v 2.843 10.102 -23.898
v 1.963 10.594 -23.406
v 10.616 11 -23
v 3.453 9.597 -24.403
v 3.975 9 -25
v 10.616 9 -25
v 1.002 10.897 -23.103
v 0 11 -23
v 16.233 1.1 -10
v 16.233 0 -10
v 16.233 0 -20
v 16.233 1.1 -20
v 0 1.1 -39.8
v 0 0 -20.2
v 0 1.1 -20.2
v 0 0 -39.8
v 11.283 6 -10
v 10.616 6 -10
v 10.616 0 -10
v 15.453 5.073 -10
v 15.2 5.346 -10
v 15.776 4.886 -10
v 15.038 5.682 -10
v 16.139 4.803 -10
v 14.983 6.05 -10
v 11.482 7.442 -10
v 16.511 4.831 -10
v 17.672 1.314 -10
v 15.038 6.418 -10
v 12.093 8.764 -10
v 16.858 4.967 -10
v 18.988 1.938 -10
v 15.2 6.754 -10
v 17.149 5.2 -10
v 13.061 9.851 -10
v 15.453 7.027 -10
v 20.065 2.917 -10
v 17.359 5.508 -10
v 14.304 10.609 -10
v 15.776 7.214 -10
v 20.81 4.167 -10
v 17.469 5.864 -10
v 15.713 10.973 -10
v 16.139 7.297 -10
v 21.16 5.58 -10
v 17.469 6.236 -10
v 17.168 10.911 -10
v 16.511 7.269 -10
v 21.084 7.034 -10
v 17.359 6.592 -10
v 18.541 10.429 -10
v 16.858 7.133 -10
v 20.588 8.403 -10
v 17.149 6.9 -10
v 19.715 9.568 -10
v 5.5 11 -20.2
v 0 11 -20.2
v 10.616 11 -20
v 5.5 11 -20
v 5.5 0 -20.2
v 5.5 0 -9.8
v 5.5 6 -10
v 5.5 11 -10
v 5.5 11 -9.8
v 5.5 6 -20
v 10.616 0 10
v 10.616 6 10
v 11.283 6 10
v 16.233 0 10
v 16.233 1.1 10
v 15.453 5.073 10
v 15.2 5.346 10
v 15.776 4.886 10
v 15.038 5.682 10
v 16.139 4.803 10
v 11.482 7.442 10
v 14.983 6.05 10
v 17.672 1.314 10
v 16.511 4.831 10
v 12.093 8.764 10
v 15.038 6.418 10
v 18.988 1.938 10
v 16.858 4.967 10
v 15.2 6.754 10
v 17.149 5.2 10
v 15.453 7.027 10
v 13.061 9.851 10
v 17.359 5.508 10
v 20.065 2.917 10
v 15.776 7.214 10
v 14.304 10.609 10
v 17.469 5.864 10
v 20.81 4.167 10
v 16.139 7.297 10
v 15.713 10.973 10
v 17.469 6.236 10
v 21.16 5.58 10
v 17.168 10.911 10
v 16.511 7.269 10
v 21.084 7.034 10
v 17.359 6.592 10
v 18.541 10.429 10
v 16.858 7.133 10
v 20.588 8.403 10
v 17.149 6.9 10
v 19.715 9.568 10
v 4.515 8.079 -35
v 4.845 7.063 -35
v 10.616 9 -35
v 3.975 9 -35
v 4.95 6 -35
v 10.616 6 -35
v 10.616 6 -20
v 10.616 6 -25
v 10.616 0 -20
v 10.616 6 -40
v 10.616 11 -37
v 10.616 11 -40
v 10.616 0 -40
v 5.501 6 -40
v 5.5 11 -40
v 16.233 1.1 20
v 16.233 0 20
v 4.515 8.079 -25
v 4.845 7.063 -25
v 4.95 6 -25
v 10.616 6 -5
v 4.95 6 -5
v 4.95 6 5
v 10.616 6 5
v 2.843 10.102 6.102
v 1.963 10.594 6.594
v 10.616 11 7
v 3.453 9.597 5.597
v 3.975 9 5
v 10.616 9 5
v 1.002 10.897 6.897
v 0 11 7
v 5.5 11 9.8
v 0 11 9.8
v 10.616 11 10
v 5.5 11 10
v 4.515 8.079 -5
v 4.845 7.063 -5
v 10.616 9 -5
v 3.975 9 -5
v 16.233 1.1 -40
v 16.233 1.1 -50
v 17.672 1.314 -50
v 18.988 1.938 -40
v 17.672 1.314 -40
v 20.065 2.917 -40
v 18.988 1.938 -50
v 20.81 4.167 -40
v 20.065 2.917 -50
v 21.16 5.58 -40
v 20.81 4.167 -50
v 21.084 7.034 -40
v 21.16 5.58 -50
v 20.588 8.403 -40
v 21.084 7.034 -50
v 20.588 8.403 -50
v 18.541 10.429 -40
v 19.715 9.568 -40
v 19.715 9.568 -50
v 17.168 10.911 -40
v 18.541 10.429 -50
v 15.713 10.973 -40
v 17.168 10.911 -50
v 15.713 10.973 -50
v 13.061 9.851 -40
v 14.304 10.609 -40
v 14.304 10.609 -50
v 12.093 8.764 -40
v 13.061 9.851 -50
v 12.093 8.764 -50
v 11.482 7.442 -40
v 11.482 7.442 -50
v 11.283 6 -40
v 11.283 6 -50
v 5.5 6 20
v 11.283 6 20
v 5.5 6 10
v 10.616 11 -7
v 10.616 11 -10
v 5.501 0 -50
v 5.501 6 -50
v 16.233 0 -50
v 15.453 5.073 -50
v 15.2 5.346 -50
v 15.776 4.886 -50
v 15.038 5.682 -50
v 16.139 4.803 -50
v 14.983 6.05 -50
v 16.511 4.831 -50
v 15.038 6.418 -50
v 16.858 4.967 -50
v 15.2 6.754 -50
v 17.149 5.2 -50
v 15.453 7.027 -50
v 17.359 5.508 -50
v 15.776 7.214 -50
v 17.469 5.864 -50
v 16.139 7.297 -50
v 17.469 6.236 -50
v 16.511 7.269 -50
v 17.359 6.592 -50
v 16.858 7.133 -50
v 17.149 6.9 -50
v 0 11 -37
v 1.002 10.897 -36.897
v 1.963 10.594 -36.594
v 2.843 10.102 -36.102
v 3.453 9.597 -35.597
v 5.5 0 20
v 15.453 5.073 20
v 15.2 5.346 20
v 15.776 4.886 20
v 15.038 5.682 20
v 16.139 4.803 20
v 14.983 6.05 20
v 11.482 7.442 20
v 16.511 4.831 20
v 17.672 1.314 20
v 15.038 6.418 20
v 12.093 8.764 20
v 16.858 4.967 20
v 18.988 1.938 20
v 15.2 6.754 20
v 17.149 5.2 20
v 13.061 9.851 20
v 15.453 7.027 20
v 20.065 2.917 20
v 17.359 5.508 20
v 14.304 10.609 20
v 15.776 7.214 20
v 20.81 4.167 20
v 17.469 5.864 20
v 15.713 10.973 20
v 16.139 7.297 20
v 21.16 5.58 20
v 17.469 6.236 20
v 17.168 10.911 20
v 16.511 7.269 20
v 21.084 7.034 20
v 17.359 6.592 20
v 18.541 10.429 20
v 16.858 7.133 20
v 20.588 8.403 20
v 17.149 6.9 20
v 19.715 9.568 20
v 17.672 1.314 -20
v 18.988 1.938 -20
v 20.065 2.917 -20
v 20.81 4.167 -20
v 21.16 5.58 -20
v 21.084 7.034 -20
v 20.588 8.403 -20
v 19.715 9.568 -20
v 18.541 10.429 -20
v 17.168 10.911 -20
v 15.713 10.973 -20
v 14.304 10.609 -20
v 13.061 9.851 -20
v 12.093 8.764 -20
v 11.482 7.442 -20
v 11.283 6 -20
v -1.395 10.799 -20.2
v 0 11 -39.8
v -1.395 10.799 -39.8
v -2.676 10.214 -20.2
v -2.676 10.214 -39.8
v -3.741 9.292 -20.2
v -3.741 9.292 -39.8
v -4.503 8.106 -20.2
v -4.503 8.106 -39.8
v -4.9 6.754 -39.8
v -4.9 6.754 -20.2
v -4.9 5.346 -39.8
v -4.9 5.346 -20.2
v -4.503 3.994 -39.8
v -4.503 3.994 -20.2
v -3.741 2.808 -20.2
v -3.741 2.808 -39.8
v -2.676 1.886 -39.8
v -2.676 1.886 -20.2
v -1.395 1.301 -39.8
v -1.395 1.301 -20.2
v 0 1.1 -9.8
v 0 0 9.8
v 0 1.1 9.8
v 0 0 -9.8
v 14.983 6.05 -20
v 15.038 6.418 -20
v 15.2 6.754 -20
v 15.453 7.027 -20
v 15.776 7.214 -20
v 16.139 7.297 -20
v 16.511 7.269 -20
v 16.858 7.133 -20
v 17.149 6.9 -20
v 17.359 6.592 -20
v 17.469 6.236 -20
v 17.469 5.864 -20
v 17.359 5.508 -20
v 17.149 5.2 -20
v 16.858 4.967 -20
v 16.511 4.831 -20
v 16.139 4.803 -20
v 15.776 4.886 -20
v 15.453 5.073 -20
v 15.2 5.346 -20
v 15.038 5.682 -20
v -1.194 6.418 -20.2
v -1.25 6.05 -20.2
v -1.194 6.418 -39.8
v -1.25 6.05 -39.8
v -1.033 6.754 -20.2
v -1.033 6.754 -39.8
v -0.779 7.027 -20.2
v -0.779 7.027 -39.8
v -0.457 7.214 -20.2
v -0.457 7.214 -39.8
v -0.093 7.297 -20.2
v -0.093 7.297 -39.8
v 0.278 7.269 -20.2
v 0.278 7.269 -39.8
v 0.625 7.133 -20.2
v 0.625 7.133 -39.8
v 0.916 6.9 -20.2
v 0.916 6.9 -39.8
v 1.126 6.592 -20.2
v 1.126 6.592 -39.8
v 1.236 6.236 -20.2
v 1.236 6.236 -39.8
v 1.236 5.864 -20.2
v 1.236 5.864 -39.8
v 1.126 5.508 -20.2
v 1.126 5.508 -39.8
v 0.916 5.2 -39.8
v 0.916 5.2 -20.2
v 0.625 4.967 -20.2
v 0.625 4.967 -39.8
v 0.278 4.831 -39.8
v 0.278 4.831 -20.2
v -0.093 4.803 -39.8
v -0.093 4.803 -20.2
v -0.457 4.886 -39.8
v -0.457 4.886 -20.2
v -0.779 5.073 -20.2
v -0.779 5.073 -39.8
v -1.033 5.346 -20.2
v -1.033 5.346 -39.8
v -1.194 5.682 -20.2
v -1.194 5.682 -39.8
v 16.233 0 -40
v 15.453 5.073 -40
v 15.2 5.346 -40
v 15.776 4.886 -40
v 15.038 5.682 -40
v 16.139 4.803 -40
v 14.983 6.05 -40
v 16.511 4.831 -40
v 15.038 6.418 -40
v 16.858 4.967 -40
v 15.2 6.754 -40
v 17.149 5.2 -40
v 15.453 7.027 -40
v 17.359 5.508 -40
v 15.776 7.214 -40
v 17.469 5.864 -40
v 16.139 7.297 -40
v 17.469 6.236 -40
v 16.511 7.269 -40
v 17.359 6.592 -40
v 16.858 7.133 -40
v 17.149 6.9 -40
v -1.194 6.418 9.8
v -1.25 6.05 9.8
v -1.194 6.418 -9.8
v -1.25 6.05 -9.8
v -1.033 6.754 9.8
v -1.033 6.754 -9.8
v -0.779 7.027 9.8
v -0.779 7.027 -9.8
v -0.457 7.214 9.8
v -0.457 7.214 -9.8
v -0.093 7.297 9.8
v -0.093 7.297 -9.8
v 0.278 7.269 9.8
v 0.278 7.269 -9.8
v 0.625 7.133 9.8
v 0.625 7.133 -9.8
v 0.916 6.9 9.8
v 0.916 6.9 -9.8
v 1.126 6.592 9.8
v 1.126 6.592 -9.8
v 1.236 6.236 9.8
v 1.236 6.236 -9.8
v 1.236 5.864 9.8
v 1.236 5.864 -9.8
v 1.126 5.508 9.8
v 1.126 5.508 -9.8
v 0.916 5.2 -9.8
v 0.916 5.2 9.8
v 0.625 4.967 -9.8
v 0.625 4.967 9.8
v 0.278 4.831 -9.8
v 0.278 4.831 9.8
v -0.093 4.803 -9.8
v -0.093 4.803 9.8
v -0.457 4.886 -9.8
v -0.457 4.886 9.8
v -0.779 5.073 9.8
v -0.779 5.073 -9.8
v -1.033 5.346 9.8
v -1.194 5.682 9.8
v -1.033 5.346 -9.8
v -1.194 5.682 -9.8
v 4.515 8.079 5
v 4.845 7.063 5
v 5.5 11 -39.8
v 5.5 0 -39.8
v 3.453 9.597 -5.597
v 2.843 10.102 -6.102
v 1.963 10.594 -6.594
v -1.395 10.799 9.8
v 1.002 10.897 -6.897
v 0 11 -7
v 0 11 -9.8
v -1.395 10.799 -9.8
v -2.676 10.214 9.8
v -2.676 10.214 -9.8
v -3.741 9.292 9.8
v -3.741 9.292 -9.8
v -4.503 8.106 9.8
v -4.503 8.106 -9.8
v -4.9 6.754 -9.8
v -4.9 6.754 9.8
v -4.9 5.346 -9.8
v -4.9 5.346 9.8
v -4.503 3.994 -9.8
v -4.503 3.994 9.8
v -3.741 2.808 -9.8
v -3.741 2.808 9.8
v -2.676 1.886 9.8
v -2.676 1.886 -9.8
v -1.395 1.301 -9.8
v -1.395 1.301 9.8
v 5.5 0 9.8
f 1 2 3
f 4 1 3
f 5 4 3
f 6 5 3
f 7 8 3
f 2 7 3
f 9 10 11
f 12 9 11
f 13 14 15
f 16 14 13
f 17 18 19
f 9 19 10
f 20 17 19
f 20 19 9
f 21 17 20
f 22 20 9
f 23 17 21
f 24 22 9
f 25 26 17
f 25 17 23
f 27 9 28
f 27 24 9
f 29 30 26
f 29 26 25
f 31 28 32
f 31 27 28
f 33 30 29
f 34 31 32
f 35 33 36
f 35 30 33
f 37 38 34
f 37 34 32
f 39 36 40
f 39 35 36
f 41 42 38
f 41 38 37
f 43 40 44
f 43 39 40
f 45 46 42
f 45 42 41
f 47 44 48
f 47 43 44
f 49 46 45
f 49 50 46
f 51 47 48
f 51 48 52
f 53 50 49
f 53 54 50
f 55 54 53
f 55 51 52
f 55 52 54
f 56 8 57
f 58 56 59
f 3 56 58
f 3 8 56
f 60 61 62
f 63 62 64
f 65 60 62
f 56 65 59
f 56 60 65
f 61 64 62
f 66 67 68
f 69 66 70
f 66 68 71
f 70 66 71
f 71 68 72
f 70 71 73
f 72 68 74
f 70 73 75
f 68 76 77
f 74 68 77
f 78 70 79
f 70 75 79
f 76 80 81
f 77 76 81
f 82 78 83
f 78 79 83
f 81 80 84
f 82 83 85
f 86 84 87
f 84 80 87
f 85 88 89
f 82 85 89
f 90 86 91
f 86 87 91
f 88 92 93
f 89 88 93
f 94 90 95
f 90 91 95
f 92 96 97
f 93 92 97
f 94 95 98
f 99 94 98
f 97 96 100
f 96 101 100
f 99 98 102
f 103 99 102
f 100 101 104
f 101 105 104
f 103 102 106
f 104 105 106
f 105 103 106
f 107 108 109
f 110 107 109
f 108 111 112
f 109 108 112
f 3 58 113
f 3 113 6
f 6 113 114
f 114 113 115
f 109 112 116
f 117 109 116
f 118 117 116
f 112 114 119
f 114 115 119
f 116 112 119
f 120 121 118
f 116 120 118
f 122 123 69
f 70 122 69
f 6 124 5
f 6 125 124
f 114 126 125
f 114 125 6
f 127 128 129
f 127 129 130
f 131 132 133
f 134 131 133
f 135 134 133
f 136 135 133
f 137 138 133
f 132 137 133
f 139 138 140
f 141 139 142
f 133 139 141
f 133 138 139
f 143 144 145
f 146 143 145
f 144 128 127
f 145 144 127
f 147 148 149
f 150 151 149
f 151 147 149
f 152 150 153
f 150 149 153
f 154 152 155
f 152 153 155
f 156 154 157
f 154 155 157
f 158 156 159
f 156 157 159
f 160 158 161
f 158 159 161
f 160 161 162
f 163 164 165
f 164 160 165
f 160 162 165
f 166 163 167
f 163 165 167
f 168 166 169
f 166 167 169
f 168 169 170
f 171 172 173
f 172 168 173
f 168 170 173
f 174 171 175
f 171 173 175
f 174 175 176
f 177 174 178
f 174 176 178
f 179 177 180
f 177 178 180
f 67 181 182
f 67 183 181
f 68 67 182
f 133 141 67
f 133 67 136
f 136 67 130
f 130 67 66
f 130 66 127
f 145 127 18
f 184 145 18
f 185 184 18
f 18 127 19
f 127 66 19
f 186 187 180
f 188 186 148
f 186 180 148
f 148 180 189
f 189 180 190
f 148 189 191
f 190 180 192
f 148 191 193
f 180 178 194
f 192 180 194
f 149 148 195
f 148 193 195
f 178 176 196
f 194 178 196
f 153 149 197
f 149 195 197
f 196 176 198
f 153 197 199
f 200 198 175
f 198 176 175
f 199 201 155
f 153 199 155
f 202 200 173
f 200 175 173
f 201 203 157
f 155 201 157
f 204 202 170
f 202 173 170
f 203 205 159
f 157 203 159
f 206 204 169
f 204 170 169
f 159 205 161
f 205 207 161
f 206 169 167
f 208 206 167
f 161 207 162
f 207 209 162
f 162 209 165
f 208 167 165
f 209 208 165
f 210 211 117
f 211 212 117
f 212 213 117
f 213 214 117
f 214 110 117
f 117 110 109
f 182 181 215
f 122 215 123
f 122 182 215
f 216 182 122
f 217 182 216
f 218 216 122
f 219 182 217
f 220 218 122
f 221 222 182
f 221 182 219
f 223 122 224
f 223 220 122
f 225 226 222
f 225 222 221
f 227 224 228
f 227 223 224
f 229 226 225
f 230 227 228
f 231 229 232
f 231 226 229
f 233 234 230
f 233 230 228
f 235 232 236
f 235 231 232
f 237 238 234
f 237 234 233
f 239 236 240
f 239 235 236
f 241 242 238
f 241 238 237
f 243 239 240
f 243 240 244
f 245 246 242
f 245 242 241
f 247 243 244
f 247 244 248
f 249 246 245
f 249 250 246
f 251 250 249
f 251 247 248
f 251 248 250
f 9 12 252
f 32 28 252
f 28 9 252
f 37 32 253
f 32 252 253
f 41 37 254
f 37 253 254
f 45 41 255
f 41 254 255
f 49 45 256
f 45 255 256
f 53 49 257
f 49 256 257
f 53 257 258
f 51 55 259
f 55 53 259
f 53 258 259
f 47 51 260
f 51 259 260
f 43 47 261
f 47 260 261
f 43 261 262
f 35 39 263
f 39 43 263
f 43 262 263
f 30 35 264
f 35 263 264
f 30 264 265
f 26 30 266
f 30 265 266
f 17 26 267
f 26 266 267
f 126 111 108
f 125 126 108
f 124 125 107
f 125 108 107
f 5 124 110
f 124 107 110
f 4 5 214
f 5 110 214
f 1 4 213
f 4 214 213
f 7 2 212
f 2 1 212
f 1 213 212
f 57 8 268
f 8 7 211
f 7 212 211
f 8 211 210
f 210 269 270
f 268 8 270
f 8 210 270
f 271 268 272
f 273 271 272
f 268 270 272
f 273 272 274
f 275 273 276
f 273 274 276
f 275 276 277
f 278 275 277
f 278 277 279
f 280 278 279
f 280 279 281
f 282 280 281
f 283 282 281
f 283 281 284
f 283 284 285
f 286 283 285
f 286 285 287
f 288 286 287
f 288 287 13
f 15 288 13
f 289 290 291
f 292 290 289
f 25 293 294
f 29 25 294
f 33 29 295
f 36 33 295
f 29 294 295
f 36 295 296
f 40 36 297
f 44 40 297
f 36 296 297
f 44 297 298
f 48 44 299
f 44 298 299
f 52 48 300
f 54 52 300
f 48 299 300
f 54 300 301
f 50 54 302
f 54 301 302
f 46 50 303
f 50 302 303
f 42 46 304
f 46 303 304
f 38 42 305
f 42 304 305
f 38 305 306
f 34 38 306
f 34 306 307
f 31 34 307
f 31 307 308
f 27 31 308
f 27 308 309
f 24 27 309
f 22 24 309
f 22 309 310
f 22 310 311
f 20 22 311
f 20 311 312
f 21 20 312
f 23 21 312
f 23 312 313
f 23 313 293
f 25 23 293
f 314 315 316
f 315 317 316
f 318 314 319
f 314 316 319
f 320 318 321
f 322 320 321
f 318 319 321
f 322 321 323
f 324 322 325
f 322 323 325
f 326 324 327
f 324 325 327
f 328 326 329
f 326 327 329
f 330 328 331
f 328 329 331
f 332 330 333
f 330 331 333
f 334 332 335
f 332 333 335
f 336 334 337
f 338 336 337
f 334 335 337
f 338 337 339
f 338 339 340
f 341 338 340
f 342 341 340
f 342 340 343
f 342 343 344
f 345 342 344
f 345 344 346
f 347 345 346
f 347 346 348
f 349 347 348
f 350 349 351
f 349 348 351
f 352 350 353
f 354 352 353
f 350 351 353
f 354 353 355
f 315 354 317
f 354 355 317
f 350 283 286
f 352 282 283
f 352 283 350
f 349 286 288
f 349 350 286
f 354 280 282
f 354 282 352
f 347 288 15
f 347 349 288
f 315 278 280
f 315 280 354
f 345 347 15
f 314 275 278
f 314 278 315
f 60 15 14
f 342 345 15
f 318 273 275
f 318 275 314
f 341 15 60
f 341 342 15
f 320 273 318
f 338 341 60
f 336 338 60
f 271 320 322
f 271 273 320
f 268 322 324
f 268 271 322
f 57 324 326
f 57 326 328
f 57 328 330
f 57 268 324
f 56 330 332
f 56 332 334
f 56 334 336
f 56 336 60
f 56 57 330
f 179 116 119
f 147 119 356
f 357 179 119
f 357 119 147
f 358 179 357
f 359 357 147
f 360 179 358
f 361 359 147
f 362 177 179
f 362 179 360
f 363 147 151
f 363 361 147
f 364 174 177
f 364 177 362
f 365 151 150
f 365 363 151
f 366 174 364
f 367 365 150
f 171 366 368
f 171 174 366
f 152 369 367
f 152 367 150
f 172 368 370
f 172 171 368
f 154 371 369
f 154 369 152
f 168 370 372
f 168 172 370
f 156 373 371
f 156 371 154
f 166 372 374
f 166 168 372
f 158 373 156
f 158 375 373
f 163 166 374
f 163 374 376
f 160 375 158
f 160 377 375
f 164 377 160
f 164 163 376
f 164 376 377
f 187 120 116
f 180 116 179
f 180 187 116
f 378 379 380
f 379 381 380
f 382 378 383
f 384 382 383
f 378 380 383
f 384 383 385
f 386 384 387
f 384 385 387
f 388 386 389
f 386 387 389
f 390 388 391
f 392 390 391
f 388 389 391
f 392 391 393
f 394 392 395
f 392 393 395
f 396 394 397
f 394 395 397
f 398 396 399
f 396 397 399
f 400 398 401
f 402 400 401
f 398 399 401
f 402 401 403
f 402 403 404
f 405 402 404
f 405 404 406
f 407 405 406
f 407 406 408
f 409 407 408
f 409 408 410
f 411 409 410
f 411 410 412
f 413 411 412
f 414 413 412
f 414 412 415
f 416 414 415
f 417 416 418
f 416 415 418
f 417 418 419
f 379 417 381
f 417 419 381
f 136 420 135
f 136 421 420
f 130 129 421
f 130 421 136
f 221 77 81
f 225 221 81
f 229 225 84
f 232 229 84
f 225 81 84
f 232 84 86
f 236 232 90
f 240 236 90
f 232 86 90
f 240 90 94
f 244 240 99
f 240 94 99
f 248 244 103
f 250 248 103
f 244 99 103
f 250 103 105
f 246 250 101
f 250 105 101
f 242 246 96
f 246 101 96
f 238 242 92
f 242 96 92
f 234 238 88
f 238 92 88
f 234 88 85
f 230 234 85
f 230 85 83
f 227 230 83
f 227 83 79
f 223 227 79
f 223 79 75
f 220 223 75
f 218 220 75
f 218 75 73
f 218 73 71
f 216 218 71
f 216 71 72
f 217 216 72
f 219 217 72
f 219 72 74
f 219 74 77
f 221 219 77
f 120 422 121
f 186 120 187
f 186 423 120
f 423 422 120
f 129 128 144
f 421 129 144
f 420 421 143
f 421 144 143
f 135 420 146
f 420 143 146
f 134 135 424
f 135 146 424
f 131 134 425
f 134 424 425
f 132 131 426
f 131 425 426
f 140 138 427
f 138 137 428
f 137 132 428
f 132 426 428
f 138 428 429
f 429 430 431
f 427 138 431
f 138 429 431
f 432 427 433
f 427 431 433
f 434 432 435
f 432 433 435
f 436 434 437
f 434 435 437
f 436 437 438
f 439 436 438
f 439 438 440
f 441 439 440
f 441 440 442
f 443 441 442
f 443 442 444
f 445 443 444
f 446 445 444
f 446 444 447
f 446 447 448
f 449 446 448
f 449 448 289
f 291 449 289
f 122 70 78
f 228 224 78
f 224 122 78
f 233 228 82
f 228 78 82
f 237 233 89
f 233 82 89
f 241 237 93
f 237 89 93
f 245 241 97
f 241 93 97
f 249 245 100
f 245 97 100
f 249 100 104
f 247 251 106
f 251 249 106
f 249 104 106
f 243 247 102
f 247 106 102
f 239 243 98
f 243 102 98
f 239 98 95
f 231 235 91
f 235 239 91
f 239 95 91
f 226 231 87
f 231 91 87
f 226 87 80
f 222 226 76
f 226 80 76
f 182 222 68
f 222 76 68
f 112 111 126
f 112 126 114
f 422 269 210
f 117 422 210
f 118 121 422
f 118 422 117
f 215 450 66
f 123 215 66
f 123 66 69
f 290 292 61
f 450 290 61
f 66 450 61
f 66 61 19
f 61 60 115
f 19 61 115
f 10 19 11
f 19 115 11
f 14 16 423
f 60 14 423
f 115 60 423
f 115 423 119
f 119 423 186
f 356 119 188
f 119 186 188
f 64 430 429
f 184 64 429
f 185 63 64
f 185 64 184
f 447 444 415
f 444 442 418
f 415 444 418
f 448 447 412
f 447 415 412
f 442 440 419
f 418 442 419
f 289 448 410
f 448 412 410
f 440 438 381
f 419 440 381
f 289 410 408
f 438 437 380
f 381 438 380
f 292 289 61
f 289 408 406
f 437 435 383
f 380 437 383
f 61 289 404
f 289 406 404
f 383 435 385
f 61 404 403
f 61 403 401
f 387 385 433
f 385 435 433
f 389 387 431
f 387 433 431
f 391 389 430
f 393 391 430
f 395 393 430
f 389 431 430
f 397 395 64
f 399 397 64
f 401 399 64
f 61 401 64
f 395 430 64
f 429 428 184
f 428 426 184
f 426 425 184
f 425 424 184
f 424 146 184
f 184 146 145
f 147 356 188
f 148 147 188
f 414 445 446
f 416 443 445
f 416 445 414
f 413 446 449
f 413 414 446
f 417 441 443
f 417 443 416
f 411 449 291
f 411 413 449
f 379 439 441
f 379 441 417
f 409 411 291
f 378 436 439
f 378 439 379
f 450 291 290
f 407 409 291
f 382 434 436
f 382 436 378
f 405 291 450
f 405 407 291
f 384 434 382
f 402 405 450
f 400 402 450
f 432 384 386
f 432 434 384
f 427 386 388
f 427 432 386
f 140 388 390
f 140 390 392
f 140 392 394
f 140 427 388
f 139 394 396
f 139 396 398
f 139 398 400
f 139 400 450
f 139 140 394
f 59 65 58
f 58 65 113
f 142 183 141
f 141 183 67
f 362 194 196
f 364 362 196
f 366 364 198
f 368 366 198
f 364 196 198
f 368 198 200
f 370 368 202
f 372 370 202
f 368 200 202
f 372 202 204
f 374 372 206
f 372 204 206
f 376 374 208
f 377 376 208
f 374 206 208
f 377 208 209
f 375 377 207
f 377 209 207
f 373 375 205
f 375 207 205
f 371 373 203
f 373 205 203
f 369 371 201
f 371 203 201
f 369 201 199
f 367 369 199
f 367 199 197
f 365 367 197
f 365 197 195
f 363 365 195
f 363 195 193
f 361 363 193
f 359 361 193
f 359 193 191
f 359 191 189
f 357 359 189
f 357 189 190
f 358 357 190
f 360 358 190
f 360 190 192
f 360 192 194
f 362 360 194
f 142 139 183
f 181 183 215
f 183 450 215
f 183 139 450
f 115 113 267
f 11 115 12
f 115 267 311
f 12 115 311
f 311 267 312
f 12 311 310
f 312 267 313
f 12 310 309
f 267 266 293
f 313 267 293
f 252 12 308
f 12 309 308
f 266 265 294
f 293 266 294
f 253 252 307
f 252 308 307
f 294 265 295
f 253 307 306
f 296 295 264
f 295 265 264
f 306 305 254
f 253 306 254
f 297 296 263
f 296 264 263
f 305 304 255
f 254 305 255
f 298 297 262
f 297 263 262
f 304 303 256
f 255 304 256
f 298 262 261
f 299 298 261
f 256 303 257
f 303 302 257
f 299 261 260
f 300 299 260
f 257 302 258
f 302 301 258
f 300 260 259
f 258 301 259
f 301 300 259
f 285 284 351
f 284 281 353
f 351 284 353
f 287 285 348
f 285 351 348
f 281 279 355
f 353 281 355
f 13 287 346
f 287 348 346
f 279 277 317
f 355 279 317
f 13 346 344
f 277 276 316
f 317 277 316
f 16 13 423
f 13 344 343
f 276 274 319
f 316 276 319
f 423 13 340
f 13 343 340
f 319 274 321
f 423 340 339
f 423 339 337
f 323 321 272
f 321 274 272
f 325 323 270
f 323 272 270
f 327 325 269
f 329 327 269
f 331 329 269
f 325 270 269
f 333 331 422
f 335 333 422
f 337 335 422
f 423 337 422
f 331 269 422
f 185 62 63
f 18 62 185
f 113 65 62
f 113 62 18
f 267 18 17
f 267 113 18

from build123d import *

# Parameters (mm, degrees)
SKETCH1_W             = 10.6165
SKETCH1_H             = 20
SKETCH1_W_2           = 10.732
SKETCH1_H_2           = 10
BOSS_EXTRUDE1_DEPTH   = 6
SKETCH2_W             = 10.6165
SKETCH2_H             = 5
BOSS_EXTRUDE2_DEPTH   = 5
CHAMFER1_SIZE         = 2
BOSS_EXTRUDE3_START   = -10
SKETCH3_R             = 4.95
BOSS_EXTRUDE3_DEPTH   = 20
BOSS_EXTRUDE4_START   = 10
SKETCH3_3_R           = 4.95
BOSS_EXTRUDE4_DEPTH   = 10
BOSS_EXTRUDE5_START   = -20
SKETCH3_4_R           = 4.95
BOSS_EXTRUDE5_DEPTH   = 10
BOSS_EXTRUDE6_START   = -40
SKETCH3_5_R           = 4.95
BOSS_EXTRUDE6_DEPTH   = 20
BOSS_EXTRUDE7_START   = -50
SKETCH3_6_R           = 4.95
BOSS_EXTRUDE7_DEPTH   = 10
F_1_0MM_DOWEL_HOLE1_D = 2.5
CUT_EXTRUDE1_START    = -0.2
CUT_EXTRUDE1_DEPTH    = 0.2
CUT_EXTRUDE2_START    = -30.2
CUT_EXTRUDE2_DEPTH    = 10.4
CUT_EXTRUDE3_START    = -50
CUT_EXTRUDE3_DEPTH    = 0.2


with BuildPart() as part:
    # Sketch1 → Boss-Extrude1 (new body)
    with BuildSketch(Plane(origin=(0, 0, 0), x_dir=(1, 0, 0), z_dir=(0, 1, 0))):
        Polygon((16.2325, -10), (10.6165, -10), (5.5005, -10), (5.5005, -20), (16.2325, -20), align=None)
        Polygon((10.6165, 0), (0, 0), (0, -10), (5.5005, -10), (10.6165, -10), align=None)
        Polygon((0, 10), (0, 0), (10.6165, 0), (10.6165, 10), (5.5005, 10), align=None)
        Polygon((5.5005, 10), (10.6165, 10), (16.2325, 10), (16.2325, 20), (10.6165, 20), (5.5005, 20), align=None)
        with Locations((5.30825, 30)):
            Rectangle(SKETCH1_W, SKETCH1_H)
        with Locations((10.8665, 45)):
            Rectangle(SKETCH1_W_2, SKETCH1_H_2)
    extrude(amount=BOSS_EXTRUDE1_DEPTH)

    # Sketch2 → Boss-Extrude2 (add)
    with BuildSketch(Plane(origin=(0, 6, 0), x_dir=(1, 0, 0), z_dir=(0, 1, 0))):
        with Locations((5.30825, 7.5)):
            Rectangle(SKETCH2_W, SKETCH2_H)
        with Locations((5.30825, -7.5)):
            Rectangle(SKETCH2_W, SKETCH2_H)
        with Locations((5.30825, 37.5)):
            Rectangle(SKETCH2_W, SKETCH2_H)
        with Locations((5.30825, 22.5)):
            Rectangle(SKETCH2_W, SKETCH2_H)
    extrude(amount=BOSS_EXTRUDE2_DEPTH)

    # Chamfer1
    chamfer1_edges = [part.edges().sort_by_distance(p)[0] for p in [
        (5.30825, 11, -35),
        (5.30825, 11, -25),
        (5.30825, 11, -5),
        (5.30825, 11, 5),
    ]]
    chamfer(chamfer1_edges, length=CHAMFER1_SIZE)

    # Sketch3 → Boss-Extrude3 (add)
    with BuildSketch(Plane.XY.offset(BOSS_EXTRUDE3_START)):
        with Locations((0, 6.05)):
            Circle(SKETCH3_R)
    extrude(amount=BOSS_EXTRUDE3_DEPTH)

    # Sketch3<3> → Boss-Extrude4 (add)
    with BuildSketch(Plane.XY.offset(BOSS_EXTRUDE4_START)):
        with Locations((16.2325, 6.05)):
            Circle(SKETCH3_3_R)
    extrude(amount=BOSS_EXTRUDE4_DEPTH)

    # Sketch3<4> → Boss-Extrude5 (add)
    with BuildSketch(Plane.XY.offset(BOSS_EXTRUDE5_START)):
        with Locations((16.2325, 6.05)):
            Circle(SKETCH3_4_R)
    extrude(amount=BOSS_EXTRUDE5_DEPTH)

    # Sketch3<5> → Boss-Extrude6 (add)
    with BuildSketch(Plane.XY.offset(BOSS_EXTRUDE6_START)):
        with Locations((0, 6.05)):
            Circle(SKETCH3_5_R)
    extrude(amount=BOSS_EXTRUDE6_DEPTH)

    # Sketch3<6> → Boss-Extrude7 (add)
    with BuildSketch(Plane.XY.offset(BOSS_EXTRUDE7_START)):
        with Locations((16.2325, 6.05)):
            Circle(SKETCH3_6_R)
    extrude(amount=BOSS_EXTRUDE7_DEPTH)

    # Ø1.0mm Dowel Hole1 (through all)
    with Locations(Plane.XY.offset(20)):
        with Locations((0, 6.05), (16.2325, 6.05)):
            Hole(F_1_0MM_DOWEL_HOLE1_D / 2)

    # Sketch9 → Cut-Extrude1 (cut)
    with BuildSketch(Plane.XY.offset(10).offset(CUT_EXTRUDE1_START)):
        with BuildLine():
            Line((5.5005, 6), (5.5005, 11))
            Line((5.5005, 11), (0, 11))
            ThreePointArc((0, 11), (-4.95, 6.05), (0, 1.1))
            Line((0, 1.1), (0, 0))
            Line((0, 0), (5.5005, 0))
            Line((5.5005, 0), (5.5005, 6))
        make_face()
    extrude(amount=CUT_EXTRUDE1_DEPTH, mode=Mode.SUBTRACT)

    # Sketch9<2> → Cut-Extrude2 (cut)
    with BuildSketch(Plane.XY.offset(10).offset(CUT_EXTRUDE2_START)):
        with BuildLine():
            Line((5.5005, 0), (5.5005, 6))
            Line((5.5005, 6), (5.5005, 11))
            Line((5.5005, 11), (0, 11))
            ThreePointArc((0, 11), (-4.95, 6.05), (0, 1.1))
            Line((0, 1.1), (0, 0))
            Line((0, 0), (5.5005, 0))
        make_face()
    extrude(amount=CUT_EXTRUDE2_DEPTH, mode=Mode.SUBTRACT)

    # Sketch9<4> → Cut-Extrude3 (cut)
    with BuildSketch(Plane.XY.offset(10).offset(CUT_EXTRUDE3_START)):
        with BuildLine():
            Line((5.5005, 0), (5.5005, 6))
            Line((5.5005, 6), (5.5005, 11))
            Line((5.5005, 11), (0, 11))
            ThreePointArc((0, 11), (-4.95, 6.05), (0, 1.1))
            Line((0, 1.1), (0, 0))
            Line((0, 0), (5.5005, 0))
        make_face()
    extrude(amount=CUT_EXTRUDE3_DEPTH, mode=Mode.SUBTRACT)


solid = part.part
